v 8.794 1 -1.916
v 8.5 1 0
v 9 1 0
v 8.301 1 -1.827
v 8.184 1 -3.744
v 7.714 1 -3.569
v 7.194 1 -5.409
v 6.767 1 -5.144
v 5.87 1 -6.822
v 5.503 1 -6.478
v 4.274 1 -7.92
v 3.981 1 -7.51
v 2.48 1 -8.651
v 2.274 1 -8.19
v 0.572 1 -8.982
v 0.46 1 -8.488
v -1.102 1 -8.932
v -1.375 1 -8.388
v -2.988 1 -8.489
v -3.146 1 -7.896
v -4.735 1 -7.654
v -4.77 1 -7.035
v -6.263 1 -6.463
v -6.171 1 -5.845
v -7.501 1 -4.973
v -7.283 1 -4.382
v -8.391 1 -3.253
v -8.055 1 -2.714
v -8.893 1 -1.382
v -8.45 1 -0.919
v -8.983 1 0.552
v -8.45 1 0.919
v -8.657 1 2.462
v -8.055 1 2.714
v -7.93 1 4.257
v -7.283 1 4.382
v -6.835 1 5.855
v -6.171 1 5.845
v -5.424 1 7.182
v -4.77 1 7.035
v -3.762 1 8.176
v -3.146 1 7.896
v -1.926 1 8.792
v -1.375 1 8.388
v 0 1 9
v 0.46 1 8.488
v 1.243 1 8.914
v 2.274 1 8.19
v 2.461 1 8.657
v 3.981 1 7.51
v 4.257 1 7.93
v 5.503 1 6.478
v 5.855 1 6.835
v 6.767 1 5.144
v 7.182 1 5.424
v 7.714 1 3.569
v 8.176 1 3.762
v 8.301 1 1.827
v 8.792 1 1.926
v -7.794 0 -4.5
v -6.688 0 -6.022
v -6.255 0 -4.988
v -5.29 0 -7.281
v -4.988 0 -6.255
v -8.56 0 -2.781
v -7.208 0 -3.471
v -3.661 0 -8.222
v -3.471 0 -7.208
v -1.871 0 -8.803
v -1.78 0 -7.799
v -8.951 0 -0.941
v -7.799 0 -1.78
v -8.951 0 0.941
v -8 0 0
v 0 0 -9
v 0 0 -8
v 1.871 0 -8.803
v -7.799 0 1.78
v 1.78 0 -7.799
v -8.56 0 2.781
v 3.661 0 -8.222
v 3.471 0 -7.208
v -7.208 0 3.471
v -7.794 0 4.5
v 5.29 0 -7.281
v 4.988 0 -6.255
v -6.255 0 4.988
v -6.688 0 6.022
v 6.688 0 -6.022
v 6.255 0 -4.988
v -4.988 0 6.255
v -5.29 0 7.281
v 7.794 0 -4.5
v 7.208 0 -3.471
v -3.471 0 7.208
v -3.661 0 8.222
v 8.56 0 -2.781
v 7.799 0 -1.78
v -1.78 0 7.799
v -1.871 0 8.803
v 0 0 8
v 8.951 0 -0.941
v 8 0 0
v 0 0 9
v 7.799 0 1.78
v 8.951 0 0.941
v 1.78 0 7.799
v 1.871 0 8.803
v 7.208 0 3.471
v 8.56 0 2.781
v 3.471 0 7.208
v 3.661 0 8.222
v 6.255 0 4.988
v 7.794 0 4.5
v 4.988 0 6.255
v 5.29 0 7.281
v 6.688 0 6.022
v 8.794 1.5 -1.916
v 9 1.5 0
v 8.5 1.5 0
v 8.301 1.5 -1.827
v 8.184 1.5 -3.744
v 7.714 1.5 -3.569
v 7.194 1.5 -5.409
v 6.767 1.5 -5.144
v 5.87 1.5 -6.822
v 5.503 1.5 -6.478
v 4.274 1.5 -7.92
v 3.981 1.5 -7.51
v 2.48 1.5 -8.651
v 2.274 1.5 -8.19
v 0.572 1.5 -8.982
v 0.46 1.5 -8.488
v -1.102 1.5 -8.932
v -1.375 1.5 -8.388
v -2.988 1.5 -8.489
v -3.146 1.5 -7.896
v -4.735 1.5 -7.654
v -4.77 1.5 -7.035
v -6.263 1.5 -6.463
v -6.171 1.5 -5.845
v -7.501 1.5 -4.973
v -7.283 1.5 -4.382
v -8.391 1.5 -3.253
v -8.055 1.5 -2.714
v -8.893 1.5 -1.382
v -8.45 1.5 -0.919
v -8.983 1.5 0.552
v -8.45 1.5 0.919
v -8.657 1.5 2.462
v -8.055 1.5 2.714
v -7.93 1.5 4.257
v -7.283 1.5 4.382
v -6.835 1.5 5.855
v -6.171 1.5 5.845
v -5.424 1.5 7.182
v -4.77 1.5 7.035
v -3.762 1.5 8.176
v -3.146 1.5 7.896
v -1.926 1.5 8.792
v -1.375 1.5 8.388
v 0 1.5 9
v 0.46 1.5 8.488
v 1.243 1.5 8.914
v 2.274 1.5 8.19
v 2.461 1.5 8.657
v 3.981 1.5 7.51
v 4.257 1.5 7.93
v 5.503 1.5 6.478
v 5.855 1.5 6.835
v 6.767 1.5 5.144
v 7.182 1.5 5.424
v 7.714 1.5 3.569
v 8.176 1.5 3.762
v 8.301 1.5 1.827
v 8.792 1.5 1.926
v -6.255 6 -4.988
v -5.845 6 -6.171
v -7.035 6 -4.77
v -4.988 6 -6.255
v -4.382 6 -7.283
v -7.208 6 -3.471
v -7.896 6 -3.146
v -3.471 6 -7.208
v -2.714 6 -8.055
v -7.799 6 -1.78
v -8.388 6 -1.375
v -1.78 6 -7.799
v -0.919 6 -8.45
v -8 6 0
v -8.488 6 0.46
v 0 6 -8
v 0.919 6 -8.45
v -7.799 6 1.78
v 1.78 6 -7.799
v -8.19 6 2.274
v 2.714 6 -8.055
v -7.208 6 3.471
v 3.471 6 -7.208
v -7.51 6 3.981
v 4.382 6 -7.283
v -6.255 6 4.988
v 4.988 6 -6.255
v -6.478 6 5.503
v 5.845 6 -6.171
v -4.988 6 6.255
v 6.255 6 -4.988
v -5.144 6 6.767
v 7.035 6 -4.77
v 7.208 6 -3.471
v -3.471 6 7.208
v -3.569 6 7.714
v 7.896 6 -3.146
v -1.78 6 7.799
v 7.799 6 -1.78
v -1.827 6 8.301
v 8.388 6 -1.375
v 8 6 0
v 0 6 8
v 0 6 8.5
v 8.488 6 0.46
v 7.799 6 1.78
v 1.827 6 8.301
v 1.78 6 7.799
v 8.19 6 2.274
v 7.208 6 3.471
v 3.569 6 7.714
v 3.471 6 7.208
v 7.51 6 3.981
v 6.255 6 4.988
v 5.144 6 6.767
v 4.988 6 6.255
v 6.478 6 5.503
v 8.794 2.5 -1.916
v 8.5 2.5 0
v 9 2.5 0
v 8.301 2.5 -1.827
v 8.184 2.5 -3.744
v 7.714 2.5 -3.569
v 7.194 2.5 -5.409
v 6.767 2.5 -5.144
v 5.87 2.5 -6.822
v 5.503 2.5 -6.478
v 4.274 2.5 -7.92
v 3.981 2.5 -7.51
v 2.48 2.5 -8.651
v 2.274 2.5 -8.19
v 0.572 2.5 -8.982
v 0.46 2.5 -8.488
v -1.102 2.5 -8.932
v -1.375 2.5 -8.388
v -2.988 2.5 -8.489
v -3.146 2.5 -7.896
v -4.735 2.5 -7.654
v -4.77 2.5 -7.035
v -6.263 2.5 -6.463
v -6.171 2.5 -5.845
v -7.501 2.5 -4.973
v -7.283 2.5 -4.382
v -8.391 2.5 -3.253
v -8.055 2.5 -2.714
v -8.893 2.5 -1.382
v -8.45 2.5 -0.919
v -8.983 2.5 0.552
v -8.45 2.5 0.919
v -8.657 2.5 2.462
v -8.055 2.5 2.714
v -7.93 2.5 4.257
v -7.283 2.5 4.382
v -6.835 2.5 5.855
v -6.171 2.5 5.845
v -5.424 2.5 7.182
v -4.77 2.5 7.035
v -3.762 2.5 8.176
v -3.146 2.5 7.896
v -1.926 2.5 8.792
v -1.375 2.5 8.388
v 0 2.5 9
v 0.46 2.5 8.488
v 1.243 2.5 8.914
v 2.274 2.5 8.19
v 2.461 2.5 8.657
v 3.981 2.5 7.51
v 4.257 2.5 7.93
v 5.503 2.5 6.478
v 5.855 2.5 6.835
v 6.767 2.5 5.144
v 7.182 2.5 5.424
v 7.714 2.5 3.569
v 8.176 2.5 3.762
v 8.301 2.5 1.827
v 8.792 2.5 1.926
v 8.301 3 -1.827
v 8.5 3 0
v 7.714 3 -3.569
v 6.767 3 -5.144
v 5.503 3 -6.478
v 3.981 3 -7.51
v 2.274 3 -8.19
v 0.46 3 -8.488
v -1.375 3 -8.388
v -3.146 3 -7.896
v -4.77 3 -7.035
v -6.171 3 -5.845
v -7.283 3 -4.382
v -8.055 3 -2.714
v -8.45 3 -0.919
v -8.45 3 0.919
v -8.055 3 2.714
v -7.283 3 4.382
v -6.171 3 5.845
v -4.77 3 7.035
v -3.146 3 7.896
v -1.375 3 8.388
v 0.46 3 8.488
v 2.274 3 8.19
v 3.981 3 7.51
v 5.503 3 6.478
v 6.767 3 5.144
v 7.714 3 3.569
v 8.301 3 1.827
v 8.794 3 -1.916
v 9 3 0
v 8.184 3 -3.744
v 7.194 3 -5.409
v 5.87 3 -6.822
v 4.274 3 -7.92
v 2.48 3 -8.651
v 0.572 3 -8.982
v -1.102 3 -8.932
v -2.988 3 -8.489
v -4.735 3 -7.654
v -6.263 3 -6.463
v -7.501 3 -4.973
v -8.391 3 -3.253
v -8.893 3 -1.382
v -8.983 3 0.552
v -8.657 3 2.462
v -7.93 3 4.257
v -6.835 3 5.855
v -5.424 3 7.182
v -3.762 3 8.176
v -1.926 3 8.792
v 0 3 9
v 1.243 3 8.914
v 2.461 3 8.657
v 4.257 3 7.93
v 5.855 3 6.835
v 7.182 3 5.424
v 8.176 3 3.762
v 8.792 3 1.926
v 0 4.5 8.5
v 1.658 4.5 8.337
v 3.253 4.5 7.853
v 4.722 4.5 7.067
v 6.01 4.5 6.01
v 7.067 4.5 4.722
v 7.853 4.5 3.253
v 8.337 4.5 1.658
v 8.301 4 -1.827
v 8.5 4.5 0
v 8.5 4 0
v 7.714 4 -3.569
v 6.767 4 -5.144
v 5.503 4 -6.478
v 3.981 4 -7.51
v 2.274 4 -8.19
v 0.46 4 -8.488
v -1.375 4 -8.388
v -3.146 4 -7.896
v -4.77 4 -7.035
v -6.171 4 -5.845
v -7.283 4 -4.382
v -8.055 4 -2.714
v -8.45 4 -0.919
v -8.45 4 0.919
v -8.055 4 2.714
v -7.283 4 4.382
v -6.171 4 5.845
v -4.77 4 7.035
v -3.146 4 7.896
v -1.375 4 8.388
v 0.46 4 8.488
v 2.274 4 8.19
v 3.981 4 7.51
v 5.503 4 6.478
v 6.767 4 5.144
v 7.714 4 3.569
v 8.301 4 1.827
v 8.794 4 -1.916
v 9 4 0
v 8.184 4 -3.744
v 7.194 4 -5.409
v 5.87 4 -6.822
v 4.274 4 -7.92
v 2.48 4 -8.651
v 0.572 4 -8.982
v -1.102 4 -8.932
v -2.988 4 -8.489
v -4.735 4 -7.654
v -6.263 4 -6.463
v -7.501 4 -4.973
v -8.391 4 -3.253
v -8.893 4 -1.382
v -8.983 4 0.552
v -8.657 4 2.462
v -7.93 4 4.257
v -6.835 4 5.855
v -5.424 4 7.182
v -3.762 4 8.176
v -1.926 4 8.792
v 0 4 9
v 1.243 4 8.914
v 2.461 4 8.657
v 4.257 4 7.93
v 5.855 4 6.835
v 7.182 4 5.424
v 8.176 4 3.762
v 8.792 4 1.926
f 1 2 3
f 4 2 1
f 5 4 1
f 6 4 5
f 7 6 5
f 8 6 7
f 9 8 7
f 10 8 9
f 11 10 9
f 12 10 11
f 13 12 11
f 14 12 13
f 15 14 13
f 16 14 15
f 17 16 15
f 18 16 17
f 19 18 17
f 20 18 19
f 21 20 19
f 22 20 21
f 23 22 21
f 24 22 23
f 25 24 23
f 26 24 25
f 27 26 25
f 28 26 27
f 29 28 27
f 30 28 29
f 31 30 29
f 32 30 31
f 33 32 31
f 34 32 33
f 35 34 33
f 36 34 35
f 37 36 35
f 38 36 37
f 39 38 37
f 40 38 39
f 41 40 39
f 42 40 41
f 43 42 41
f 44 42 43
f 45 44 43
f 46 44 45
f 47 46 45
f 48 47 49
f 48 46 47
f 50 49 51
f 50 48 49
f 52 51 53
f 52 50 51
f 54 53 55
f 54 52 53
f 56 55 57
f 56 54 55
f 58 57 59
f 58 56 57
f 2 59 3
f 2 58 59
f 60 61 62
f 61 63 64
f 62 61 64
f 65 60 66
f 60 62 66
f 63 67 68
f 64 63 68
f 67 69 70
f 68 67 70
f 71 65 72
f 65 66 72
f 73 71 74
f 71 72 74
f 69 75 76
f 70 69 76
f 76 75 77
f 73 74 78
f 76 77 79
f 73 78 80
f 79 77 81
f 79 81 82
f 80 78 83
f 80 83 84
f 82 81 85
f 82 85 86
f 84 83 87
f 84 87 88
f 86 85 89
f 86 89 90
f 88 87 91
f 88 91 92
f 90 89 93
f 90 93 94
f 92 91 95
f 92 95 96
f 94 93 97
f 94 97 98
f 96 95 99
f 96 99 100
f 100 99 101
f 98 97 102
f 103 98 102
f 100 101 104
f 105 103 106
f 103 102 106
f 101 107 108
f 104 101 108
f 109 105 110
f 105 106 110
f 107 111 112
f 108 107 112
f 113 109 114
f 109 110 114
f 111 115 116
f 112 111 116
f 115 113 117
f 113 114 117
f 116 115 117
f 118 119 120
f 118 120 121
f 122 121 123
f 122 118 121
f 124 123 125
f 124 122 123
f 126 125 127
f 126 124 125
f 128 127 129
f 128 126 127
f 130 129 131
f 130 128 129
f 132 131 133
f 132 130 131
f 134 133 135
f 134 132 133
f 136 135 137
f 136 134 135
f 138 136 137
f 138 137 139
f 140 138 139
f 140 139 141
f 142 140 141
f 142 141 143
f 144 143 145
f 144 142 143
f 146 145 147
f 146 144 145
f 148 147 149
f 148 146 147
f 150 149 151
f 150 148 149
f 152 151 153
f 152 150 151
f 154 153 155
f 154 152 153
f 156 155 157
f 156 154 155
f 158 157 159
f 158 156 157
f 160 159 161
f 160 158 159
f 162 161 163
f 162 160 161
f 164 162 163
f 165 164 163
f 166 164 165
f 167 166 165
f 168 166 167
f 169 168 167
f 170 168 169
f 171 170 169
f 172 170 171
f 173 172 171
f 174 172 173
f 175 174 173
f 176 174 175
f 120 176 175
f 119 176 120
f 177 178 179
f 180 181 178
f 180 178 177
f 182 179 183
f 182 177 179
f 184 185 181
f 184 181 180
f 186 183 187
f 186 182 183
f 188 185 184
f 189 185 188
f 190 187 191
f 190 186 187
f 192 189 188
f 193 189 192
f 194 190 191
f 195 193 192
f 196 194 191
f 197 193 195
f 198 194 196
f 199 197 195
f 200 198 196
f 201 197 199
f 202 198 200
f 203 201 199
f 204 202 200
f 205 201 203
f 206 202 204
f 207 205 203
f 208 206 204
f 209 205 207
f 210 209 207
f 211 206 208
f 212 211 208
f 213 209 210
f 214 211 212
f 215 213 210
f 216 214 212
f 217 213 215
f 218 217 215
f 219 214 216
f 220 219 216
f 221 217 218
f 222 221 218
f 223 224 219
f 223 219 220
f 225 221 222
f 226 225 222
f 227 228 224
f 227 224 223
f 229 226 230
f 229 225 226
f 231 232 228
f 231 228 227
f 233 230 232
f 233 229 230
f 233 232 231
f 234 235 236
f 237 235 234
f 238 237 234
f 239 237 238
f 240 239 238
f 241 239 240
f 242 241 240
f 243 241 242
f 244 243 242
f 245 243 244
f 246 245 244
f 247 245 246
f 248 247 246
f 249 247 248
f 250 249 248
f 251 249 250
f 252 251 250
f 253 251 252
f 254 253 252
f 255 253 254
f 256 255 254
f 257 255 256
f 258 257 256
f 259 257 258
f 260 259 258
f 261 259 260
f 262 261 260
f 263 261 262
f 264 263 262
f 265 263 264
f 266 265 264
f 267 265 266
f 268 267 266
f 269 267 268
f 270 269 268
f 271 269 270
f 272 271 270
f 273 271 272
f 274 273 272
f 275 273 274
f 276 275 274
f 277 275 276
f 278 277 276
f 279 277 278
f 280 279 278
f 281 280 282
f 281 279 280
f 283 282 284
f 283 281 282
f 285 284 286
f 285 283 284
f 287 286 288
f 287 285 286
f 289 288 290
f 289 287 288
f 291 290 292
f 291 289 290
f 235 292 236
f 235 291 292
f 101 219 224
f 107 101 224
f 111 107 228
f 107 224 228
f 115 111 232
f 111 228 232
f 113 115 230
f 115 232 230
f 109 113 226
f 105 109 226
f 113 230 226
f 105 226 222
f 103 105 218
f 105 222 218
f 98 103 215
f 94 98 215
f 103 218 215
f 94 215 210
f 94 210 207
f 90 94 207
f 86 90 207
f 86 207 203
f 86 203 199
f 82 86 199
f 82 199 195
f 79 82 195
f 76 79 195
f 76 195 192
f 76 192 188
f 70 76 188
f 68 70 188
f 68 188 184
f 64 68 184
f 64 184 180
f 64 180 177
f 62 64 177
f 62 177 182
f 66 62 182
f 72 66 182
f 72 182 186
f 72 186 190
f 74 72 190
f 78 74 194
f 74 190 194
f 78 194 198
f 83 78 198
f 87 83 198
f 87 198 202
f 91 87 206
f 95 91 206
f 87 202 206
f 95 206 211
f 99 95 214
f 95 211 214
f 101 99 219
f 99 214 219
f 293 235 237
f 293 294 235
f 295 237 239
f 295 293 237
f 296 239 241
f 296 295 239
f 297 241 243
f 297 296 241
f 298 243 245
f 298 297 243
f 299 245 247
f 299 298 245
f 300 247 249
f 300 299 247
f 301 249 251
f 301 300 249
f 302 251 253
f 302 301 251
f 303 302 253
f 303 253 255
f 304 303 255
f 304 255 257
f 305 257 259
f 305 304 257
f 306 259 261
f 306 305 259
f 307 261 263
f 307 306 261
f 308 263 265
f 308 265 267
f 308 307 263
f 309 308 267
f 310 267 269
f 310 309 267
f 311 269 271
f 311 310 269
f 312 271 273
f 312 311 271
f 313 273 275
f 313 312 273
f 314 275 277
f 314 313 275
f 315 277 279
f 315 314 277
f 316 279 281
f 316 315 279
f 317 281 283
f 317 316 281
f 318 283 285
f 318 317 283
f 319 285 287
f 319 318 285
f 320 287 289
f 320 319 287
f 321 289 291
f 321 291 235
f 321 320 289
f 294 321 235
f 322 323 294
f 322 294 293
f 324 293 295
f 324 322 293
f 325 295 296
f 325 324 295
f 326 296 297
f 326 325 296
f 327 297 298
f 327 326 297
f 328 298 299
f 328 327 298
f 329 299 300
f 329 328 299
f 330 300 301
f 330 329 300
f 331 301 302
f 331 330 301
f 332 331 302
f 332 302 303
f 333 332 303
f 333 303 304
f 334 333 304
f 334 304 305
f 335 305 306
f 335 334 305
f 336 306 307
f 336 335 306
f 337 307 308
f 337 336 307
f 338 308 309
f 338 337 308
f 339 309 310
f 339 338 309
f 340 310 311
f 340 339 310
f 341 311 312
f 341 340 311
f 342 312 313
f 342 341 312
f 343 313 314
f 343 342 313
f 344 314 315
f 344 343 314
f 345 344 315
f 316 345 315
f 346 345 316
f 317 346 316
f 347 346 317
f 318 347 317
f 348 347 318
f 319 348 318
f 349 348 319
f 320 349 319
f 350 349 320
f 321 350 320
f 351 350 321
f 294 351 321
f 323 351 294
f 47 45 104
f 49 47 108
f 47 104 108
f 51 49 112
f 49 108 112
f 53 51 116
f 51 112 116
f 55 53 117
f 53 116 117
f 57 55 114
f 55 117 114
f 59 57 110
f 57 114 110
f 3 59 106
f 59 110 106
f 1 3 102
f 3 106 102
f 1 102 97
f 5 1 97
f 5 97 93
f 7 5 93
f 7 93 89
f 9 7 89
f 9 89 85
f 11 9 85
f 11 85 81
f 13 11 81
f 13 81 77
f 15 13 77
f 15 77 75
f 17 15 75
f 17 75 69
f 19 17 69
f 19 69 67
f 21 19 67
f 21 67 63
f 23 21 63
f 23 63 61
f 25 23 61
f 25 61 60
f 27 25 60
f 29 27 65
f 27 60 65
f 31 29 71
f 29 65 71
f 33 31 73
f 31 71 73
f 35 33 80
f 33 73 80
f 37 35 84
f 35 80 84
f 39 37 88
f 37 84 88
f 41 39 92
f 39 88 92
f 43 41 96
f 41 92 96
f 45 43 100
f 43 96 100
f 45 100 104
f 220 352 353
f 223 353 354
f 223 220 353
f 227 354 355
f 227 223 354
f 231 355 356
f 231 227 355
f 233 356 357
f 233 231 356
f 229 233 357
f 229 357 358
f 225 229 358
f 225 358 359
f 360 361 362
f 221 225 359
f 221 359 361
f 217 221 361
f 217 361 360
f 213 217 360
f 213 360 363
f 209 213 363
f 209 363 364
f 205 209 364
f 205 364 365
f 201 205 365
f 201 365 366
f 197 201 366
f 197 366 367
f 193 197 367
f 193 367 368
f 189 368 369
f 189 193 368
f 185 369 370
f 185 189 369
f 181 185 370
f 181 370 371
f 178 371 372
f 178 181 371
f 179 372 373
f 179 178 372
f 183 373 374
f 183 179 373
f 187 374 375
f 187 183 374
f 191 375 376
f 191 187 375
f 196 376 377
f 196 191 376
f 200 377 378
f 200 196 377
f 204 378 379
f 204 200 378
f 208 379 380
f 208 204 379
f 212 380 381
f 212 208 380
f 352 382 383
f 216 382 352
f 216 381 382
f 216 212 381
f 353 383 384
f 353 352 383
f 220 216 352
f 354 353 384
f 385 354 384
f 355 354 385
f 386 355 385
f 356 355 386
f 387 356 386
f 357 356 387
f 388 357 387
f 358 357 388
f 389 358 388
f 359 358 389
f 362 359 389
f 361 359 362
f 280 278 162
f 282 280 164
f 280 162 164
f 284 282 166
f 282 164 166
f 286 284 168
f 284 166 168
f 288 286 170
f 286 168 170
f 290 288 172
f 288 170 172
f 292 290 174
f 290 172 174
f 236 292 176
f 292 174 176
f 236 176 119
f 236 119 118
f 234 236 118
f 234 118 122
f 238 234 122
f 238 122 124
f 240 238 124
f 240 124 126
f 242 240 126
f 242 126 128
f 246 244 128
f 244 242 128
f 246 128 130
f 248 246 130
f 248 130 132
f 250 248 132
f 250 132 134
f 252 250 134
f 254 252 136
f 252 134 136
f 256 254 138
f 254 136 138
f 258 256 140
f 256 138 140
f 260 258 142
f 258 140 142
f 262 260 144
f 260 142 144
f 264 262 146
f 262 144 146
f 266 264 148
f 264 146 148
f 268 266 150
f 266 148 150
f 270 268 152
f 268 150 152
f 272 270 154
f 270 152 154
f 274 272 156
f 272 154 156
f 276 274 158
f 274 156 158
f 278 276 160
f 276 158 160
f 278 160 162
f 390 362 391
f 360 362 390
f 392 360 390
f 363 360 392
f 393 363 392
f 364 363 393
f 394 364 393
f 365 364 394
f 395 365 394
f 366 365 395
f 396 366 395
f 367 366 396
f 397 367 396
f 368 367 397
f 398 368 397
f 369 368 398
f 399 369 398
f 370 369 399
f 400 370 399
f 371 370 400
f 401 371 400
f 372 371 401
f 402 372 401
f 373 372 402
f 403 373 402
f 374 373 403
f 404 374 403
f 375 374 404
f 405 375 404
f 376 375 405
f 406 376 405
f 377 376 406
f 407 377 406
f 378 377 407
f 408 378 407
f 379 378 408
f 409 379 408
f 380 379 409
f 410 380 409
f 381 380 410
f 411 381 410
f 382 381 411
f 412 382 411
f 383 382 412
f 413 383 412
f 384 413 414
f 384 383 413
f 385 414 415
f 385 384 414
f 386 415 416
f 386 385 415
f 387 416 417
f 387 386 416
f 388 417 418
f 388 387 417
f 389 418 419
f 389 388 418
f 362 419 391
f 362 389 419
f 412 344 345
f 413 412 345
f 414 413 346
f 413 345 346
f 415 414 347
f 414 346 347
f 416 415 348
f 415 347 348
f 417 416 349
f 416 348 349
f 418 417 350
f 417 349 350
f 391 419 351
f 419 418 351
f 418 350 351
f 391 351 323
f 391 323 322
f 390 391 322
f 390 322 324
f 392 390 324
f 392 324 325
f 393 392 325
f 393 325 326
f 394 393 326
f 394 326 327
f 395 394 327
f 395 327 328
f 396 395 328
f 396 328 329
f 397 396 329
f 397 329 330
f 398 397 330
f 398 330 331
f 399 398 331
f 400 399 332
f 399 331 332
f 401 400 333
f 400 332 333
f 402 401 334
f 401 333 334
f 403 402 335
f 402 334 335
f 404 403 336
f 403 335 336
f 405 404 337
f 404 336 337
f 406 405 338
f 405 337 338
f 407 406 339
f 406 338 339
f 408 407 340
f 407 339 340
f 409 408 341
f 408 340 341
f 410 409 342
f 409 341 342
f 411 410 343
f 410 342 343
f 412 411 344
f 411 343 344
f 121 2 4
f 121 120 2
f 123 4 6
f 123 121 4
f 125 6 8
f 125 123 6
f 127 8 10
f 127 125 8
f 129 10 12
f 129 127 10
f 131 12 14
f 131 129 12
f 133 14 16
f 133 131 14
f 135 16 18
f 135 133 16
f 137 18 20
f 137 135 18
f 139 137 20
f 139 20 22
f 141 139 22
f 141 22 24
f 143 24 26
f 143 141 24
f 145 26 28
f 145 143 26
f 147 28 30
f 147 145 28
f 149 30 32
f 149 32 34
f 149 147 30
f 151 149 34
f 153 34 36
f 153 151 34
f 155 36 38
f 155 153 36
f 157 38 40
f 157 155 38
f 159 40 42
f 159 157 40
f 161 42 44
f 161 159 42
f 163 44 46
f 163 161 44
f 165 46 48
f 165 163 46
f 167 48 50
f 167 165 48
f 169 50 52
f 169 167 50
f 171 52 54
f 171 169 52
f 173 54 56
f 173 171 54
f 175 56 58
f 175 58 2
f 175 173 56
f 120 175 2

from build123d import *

# Parameters (mm, degrees)
SKETCH_1_R          = 9
EXTRUDE_1_DEPTH     = 4.5
SKETCH_2_W          = 1
SKETCH_2_H          = 0.5
SKETCH_4_R          = 8
CUT_EXTRUDE_1_DEPTH = 4.5
EXTRUDE_START       = 1.5
SKETCH_6_R          = 8.5
SKETCH_6_R_2        = 8
EXTRUDE_3_DEPTH     = 1.5


with BuildPart() as part:
    # 草图1 → 凸台-拉伸1 (new body)
    with BuildSketch(Plane(origin=(0, 0, 0), x_dir=(1, 0, 0), z_dir=(0, 1, 0))):
        with Locations(Location((0, 0, 0), (0, 0, 270))):
            Circle(SKETCH_1_R)
    extrude(amount=EXTRUDE_1_DEPTH)

    # 切除-扫描1: sweep along a path in 草图3
    with BuildLine(Plane(origin=(0, 4.5, 0), x_dir=(1, 0, 0), z_dir=(0, 1, 0))) as sweep_1_path:
        CenterArc((0, 0), 9, 0, 360)
    # 草图2 → 切除-扫描1 (sweep, cut)
    with BuildSketch(Plane(origin=(0, 0, 0), x_dir=(0, 0, -1), z_dir=(1, 0, 0))):
        with Locations((-9, 4.25)):
            Rectangle(SKETCH_2_W, SKETCH_2_H)
        with Locations((-9, 2.75)):
            Rectangle(SKETCH_2_W, SKETCH_2_H)
        with Locations((-9, 1.25)):
            Rectangle(SKETCH_2_W, SKETCH_2_H)
    sweep(path=sweep_1_path.line, mode=Mode.SUBTRACT)

    # 草图4 → 切除-拉伸1 (cut)
    with BuildSketch(Plane(origin=(0, 4.5, 0), x_dir=(1, 0, 0), z_dir=(0, 1, 0))):
        with Locations(Location((0, 0, 0), (0, 0, 270))):
            Circle(SKETCH_4_R)
    extrude(amount=-CUT_EXTRUDE_1_DEPTH, mode=Mode.SUBTRACT)

    # 草图6 → 凸台-拉伸3 (add)
    with BuildSketch(Plane(origin=(0, 4.5, 0), x_dir=(1, 0, 0), z_dir=(0, 1, 0)).offset(EXTRUDE_START)):
        with Locations(Location((0, 0, 0), (0, 0, 270))):
            Circle(SKETCH_6_R)
        with Locations(Location((0, 0, 0), (0, 0, 270))):
            Circle(SKETCH_6_R_2, mode=Mode.SUBTRACT)
    extrude(amount=-EXTRUDE_3_DEPTH)


solid = part.part
